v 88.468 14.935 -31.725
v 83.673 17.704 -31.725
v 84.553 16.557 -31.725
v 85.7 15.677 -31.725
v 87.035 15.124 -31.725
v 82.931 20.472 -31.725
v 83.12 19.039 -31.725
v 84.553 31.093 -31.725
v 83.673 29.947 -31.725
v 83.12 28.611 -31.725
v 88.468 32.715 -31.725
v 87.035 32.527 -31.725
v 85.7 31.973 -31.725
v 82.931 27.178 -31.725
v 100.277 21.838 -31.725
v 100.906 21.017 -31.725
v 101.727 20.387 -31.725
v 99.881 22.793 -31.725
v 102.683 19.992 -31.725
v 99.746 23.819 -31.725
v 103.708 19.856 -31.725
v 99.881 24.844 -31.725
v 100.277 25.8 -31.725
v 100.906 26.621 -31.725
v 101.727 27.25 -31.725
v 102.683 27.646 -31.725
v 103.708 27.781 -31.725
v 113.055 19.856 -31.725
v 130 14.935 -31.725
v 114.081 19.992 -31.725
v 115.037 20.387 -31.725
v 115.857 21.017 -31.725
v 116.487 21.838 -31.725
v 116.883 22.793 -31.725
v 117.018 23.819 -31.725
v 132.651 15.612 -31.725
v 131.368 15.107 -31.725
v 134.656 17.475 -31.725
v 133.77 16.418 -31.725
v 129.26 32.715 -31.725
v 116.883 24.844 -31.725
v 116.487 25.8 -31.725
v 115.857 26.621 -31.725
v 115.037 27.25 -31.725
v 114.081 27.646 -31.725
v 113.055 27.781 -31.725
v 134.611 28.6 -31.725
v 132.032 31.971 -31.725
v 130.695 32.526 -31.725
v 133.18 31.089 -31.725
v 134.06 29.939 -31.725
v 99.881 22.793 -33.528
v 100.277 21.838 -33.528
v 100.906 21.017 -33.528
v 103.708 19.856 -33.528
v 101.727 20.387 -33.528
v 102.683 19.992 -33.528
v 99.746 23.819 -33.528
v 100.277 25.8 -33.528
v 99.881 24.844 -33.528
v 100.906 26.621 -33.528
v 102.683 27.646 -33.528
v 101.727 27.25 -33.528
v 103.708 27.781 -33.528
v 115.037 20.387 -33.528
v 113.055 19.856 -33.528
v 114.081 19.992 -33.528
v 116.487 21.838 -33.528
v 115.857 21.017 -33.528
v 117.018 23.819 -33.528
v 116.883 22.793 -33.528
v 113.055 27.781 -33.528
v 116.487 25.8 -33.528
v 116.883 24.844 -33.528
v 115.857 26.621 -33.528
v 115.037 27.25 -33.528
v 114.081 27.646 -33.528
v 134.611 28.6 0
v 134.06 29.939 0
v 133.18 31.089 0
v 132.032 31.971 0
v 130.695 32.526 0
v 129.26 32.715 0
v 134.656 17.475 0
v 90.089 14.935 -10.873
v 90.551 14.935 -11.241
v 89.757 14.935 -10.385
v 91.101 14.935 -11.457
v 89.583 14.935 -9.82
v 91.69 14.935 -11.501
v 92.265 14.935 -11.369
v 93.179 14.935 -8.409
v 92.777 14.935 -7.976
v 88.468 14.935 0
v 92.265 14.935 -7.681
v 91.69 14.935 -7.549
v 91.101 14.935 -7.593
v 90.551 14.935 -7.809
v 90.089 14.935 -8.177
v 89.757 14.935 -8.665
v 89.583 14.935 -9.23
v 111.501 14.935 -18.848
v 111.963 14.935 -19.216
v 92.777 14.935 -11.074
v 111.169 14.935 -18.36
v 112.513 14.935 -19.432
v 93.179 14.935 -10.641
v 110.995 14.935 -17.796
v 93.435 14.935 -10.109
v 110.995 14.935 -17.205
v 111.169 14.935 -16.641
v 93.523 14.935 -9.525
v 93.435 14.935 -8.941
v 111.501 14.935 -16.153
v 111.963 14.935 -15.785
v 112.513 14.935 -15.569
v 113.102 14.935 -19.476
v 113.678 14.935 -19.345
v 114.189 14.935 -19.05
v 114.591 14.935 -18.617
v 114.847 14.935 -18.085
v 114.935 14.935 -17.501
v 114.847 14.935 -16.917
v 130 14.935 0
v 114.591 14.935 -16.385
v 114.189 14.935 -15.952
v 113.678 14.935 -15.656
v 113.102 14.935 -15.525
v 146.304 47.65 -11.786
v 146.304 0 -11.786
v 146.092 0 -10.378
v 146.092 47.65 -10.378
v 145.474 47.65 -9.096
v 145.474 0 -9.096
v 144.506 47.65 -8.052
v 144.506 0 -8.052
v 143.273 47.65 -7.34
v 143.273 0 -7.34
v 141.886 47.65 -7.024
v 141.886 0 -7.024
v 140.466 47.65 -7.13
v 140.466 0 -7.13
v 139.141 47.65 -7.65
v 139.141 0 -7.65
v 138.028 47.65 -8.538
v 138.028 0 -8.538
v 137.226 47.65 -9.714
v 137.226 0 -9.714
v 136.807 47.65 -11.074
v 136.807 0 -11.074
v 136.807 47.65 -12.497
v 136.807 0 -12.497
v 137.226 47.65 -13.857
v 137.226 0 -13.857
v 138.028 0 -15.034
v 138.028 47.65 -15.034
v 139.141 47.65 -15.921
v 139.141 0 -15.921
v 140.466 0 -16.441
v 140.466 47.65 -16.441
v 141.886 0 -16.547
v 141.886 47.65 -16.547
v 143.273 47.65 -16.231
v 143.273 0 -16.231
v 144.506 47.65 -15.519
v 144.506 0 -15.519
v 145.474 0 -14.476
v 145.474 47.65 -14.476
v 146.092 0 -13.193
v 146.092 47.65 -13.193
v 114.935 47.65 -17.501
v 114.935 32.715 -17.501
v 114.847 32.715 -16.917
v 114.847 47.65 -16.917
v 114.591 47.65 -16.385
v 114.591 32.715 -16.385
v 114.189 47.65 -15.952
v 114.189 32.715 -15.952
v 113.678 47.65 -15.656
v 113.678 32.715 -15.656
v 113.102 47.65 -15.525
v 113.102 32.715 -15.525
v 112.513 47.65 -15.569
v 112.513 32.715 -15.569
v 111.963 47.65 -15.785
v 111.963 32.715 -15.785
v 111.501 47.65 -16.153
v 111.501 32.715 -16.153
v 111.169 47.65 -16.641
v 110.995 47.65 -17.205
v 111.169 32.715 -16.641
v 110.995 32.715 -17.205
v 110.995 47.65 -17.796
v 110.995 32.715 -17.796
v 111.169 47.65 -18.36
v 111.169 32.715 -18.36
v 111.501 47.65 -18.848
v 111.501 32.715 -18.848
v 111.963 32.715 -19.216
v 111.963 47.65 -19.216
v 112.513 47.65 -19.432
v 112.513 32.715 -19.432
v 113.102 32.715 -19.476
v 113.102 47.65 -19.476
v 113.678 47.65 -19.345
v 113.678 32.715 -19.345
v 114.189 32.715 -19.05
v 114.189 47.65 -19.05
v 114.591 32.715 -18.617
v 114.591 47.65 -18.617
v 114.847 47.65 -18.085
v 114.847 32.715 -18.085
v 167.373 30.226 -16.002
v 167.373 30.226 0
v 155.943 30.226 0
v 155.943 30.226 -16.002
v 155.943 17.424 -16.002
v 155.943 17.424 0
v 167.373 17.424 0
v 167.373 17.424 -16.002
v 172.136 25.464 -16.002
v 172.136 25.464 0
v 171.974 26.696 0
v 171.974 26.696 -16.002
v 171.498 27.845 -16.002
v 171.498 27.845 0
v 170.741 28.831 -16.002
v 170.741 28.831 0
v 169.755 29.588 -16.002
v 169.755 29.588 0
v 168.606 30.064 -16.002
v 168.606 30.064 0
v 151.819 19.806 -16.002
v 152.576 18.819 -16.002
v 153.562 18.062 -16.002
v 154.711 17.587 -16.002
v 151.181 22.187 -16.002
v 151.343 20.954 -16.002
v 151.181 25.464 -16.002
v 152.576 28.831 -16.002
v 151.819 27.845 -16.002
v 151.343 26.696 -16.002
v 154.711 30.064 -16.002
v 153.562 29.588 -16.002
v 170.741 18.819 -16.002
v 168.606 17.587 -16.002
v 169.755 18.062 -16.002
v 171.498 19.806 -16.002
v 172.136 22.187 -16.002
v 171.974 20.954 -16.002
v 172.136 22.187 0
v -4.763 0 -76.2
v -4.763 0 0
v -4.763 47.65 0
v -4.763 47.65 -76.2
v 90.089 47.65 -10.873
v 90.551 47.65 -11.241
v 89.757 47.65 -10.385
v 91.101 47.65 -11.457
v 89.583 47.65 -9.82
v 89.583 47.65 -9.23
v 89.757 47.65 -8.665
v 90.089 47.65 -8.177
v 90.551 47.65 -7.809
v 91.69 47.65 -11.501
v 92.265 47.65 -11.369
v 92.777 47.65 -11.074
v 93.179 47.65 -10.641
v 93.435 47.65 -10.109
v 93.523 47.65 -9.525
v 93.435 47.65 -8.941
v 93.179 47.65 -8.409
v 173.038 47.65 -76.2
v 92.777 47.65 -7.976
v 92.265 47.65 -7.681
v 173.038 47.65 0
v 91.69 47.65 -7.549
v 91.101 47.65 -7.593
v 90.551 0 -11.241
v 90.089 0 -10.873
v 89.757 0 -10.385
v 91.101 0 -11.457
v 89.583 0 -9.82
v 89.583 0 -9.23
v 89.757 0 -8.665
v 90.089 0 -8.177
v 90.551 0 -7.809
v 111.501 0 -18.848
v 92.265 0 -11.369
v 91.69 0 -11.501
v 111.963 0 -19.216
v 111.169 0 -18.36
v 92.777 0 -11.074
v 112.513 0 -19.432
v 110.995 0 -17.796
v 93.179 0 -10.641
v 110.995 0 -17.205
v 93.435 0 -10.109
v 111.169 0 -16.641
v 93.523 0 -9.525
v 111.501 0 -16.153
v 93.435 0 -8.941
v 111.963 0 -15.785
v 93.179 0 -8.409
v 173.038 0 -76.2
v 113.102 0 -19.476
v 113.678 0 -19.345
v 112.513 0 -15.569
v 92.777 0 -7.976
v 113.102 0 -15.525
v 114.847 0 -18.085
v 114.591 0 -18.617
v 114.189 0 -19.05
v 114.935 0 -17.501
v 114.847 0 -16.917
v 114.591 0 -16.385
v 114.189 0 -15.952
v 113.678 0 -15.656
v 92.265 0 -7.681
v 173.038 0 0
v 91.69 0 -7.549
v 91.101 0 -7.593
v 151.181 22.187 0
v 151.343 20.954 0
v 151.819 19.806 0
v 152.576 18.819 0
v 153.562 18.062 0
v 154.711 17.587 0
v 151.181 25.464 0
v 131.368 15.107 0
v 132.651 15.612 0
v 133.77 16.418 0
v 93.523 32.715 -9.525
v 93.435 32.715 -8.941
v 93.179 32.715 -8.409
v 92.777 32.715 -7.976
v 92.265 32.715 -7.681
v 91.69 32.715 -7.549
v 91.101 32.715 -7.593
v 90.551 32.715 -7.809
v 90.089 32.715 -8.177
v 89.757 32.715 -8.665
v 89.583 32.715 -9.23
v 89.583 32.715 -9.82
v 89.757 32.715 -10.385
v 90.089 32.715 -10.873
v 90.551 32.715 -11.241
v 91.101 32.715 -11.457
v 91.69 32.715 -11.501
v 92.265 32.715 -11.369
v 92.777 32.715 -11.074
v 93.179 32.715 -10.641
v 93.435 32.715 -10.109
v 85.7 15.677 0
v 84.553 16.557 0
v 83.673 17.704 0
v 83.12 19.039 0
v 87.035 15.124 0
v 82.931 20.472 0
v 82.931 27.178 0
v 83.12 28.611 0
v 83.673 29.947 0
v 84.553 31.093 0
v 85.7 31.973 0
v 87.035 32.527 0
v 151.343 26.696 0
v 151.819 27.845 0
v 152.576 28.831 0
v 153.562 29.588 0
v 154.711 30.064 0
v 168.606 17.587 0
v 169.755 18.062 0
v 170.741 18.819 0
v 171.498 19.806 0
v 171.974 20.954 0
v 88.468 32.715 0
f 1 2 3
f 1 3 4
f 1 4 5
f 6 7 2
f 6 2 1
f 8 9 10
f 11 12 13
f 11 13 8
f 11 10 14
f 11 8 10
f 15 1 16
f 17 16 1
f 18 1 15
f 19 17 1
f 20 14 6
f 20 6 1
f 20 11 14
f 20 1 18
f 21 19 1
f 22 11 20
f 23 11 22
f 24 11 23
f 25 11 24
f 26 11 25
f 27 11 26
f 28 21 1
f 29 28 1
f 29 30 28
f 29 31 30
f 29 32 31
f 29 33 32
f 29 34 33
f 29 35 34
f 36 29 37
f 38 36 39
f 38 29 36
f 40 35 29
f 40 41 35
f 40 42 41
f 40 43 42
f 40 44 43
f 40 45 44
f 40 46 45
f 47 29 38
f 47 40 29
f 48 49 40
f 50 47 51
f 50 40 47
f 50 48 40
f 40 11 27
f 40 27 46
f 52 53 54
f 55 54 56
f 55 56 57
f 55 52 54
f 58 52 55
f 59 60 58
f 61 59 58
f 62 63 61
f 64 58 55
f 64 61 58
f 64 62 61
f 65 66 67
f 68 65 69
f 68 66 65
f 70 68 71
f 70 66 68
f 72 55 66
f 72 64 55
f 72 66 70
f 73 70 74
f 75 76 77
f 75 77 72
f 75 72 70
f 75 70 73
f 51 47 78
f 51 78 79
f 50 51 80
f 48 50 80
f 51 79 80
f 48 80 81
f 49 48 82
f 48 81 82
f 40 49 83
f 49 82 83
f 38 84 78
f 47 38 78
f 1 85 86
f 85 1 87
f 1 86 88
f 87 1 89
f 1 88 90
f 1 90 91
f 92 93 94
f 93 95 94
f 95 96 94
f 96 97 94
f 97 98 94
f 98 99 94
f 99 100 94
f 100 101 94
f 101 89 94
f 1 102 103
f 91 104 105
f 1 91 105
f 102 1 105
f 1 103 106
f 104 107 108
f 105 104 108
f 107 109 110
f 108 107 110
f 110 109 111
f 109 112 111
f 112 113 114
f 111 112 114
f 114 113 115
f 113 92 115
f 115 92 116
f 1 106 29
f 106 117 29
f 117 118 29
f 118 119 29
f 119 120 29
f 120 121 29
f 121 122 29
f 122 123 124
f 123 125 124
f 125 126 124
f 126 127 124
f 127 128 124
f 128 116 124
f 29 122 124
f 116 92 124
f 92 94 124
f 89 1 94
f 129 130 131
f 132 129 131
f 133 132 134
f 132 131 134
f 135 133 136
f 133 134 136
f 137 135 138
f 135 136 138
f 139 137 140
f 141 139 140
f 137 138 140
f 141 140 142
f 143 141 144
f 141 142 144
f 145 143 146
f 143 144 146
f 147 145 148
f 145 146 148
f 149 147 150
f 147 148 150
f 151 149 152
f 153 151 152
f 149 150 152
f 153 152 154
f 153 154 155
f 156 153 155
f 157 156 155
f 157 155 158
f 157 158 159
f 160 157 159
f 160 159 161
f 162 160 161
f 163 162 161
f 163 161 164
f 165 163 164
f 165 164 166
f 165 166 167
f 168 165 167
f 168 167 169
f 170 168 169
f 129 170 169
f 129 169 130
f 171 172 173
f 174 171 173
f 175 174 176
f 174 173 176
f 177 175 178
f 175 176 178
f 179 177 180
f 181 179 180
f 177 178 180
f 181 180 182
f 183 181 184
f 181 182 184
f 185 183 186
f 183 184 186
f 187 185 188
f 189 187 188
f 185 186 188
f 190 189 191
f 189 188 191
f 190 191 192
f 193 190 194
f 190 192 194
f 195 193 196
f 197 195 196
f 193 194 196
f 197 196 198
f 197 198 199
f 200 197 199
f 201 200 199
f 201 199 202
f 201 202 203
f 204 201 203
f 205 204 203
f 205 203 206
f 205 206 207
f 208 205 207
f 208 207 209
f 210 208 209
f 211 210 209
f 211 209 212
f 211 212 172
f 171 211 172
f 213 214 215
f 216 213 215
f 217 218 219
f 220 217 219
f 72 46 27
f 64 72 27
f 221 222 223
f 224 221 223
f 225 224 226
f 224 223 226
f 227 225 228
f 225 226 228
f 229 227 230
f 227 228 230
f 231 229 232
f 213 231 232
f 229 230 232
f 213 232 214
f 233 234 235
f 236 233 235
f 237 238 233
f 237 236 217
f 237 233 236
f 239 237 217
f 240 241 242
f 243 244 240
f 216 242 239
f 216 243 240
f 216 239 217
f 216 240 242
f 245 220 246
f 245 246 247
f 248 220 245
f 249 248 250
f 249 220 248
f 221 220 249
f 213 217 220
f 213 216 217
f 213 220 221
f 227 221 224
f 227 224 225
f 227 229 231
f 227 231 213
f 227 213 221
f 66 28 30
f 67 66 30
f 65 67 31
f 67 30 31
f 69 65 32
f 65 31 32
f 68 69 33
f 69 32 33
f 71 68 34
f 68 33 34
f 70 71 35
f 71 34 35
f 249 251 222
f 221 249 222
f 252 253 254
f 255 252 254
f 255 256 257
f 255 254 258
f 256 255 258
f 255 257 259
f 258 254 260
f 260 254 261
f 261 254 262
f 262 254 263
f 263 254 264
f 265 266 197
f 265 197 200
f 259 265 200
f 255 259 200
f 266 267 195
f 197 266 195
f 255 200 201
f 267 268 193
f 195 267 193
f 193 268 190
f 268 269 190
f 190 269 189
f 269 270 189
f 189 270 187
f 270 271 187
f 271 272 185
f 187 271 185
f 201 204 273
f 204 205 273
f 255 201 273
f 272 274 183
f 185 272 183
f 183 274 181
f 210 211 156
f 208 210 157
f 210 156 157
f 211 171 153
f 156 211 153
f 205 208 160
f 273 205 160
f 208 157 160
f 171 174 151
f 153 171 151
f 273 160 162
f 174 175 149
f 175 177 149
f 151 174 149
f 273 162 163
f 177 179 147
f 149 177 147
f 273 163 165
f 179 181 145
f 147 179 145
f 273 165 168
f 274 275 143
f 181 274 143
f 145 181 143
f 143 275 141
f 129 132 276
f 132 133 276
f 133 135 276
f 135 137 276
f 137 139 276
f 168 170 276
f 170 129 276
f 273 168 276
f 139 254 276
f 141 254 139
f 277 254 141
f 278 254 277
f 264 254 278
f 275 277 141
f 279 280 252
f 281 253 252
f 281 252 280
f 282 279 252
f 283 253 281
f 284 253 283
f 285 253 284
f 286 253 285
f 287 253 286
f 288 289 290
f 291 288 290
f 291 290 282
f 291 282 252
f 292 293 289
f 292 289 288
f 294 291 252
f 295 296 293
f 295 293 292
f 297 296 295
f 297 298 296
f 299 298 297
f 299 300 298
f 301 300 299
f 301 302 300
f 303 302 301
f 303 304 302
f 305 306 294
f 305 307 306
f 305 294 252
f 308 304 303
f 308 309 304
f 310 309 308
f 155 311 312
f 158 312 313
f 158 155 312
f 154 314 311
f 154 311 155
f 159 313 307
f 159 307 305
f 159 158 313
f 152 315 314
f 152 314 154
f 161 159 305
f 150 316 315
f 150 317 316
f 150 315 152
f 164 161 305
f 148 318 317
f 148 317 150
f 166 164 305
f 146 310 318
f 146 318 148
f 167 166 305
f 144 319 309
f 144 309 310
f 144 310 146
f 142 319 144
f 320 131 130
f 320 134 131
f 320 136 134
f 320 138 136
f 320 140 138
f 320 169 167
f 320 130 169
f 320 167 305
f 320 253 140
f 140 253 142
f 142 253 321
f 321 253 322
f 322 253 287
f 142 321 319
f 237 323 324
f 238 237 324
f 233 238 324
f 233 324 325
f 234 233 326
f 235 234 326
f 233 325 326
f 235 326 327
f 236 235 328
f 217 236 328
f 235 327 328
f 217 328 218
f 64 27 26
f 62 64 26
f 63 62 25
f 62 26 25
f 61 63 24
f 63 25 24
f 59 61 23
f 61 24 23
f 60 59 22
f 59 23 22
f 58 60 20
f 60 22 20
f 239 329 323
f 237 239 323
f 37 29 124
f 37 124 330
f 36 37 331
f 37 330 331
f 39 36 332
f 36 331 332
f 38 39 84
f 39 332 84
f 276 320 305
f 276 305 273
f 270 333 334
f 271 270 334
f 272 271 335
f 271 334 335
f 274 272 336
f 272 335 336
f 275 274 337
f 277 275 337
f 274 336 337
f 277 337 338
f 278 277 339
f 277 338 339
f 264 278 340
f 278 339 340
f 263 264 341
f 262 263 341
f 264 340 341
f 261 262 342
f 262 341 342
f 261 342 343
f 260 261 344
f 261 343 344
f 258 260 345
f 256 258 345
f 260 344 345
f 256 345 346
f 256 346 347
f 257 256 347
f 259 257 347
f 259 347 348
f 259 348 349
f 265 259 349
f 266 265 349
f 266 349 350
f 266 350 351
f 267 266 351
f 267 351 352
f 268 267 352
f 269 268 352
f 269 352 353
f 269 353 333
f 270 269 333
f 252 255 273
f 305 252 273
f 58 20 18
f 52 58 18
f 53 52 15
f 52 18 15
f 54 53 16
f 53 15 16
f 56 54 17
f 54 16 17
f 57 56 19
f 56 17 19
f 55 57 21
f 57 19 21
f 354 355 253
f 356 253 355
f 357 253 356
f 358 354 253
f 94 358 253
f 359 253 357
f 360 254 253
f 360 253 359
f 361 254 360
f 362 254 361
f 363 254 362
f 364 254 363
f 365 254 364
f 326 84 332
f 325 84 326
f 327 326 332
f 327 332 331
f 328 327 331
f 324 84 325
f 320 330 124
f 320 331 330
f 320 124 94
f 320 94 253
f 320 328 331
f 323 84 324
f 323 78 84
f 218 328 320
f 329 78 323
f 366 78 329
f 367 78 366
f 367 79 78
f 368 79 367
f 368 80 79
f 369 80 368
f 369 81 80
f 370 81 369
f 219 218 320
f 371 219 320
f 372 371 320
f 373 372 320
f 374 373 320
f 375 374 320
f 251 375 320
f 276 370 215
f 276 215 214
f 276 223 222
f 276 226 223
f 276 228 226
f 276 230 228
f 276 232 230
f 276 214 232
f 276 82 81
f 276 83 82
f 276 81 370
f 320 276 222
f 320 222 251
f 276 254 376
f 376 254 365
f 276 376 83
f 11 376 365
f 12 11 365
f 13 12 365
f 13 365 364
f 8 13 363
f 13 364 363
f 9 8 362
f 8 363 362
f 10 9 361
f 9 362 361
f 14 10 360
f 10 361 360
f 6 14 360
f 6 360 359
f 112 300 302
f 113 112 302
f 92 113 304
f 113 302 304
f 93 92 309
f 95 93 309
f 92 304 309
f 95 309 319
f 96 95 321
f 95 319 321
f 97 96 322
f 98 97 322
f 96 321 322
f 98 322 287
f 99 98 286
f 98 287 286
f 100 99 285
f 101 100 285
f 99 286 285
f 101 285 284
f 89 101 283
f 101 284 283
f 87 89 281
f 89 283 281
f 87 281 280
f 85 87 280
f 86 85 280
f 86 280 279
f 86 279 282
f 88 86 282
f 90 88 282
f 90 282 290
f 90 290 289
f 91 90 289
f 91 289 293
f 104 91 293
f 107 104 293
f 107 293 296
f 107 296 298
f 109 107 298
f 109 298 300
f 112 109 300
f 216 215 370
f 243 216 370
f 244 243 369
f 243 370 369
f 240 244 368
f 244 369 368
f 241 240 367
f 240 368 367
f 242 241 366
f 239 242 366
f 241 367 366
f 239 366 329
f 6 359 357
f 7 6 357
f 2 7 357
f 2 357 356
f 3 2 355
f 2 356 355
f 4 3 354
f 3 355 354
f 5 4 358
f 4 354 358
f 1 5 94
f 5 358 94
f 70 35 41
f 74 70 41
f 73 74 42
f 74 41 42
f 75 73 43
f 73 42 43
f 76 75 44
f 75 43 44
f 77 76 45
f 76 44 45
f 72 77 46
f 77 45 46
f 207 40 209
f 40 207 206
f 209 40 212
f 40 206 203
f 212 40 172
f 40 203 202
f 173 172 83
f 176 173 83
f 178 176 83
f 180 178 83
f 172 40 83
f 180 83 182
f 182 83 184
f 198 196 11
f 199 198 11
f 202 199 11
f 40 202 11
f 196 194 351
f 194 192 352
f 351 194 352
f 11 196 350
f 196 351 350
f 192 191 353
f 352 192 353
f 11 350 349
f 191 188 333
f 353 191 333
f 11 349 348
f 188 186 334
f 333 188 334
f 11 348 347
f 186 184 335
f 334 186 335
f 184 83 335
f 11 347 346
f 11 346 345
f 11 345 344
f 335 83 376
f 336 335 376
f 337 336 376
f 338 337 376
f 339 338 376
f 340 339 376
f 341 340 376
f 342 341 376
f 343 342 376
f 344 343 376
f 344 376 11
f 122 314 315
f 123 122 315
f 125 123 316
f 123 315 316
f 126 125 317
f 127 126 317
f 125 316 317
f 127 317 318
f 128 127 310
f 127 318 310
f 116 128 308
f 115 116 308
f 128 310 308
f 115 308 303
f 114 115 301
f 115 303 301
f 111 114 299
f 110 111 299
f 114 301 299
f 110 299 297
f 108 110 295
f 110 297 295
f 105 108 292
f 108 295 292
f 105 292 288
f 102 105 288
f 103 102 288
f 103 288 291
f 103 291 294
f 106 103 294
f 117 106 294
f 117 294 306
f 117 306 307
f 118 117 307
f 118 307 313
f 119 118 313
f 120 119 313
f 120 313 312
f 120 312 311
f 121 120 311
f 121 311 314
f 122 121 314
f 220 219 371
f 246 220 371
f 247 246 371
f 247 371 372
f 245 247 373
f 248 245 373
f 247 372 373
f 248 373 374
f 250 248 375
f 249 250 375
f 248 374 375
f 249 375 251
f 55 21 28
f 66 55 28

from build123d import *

# Parameters (mm, degrees)
F0_W     = 177.8
F0_H     = 47.6504
F1_DEPTH = 76.2
F2_R     = 4.7752
F2_R_2   = 1.9812
F3_DEPTH = 47.6514
F5_DEPTH = 16.002
F7_DEPTH = 33.528
F9_DEPTH = 31.7246


with BuildPart() as f1:
    # F0 (on Top) → F1 (new body)
    with BuildSketch(Plane.XY):
        with Locations((84.1375, 23.8252)):
            Rectangle(F0_W, F0_H)
    extrude(amount=-F1_DEPTH)

    # F2 (on Front) → F3 (cut, through all)
    with BuildSketch(Plane.XZ):
        with Locations((141.5288, -11.7856)):
            Circle(F2_R)
        with Locations((112.9538, -17.5006)):
            Circle(F2_R_2)
        with Locations((91.5416, -9.525)):
            Circle(F2_R_2)
    extrude(amount=-F3_DEPTH, mode=Mode.SUBTRACT)

    # F4 (on face) → F5 (cut)
    with BuildSketch(Plane.XY):
        with BuildLine():
            Line((172.1358, 22.1869), (172.1358, 25.4635))
            ThreePointArc((172.1358, 25.4635), (170.740896, 28.831096), (167.3733, 30.226))
            Line((167.3733, 30.226), (155.9433, 30.226))
            ThreePointArc((155.9433, 30.226), (152.575704, 28.831096), (151.1808, 25.4635))
            Line((151.1808, 25.4635), (151.1808, 22.1869))
            ThreePointArc((151.1808, 22.1869), (152.575704, 18.819304), (155.9433, 17.4244))
            Line((155.9433, 17.4244), (157.523438, 17.4244))
            Line((157.523438, 17.4244), (167.3733, 17.4244))
            ThreePointArc((167.3733, 17.4244), (170.740896, 18.819304), (172.1358, 22.1869))
        make_face()
    extrude(amount=-F5_DEPTH, mode=Mode.SUBTRACT)

    # F6 (on face) → F7 (cut)
    with BuildSketch(Plane.XY):
        with BuildLine():
            Line((113.0554, 27.781295), (103.7082, 27.781295))
            ThreePointArc((103.7082, 27.781295), (100.90636, 26.620735), (99.7458, 23.818895))
            ThreePointArc((99.7458, 23.818895), (100.90636, 21.017055), (103.7082, 19.856495))
            Line((103.7082, 19.856495), (113.0554, 19.856495))
            ThreePointArc((113.0554, 19.856495), (115.85724, 21.017055), (117.0178, 23.818895))
            ThreePointArc((117.0178, 23.818895), (115.85724, 26.620735), (113.0554, 27.781295))
        make_face()
    extrude(amount=-F7_DEPTH, mode=Mode.SUBTRACT)

    # F8 (on Top) → F9 (cut)
    with BuildSketch(Plane.XY):
        with BuildLine():
            Line((129.259735, 32.7152), (88.4682, 32.7152))
            ThreePointArc((88.4682, 32.7152), (84.552808, 31.093392), (82.931, 27.178))
            Line((82.931, 27.178), (82.931, 20.4724))
            ThreePointArc((82.931, 20.4724), (84.552808, 16.557008), (88.4682, 14.9352))
            Line((88.4682, 14.9352), (129.999633, 14.9352))
            ThreePointArc((129.999633, 14.9352), (132.65147, 15.611501), (134.655529, 17.4752))
            Line((134.655529, 17.4752), (134.611124, 28.6004))
            ThreePointArc((134.611124, 28.6004), (132.634974, 31.567573), (129.259735, 32.7152))
        make_face()
    extrude(amount=-F9_DEPTH, mode=Mode.SUBTRACT)


solid = f1.part
